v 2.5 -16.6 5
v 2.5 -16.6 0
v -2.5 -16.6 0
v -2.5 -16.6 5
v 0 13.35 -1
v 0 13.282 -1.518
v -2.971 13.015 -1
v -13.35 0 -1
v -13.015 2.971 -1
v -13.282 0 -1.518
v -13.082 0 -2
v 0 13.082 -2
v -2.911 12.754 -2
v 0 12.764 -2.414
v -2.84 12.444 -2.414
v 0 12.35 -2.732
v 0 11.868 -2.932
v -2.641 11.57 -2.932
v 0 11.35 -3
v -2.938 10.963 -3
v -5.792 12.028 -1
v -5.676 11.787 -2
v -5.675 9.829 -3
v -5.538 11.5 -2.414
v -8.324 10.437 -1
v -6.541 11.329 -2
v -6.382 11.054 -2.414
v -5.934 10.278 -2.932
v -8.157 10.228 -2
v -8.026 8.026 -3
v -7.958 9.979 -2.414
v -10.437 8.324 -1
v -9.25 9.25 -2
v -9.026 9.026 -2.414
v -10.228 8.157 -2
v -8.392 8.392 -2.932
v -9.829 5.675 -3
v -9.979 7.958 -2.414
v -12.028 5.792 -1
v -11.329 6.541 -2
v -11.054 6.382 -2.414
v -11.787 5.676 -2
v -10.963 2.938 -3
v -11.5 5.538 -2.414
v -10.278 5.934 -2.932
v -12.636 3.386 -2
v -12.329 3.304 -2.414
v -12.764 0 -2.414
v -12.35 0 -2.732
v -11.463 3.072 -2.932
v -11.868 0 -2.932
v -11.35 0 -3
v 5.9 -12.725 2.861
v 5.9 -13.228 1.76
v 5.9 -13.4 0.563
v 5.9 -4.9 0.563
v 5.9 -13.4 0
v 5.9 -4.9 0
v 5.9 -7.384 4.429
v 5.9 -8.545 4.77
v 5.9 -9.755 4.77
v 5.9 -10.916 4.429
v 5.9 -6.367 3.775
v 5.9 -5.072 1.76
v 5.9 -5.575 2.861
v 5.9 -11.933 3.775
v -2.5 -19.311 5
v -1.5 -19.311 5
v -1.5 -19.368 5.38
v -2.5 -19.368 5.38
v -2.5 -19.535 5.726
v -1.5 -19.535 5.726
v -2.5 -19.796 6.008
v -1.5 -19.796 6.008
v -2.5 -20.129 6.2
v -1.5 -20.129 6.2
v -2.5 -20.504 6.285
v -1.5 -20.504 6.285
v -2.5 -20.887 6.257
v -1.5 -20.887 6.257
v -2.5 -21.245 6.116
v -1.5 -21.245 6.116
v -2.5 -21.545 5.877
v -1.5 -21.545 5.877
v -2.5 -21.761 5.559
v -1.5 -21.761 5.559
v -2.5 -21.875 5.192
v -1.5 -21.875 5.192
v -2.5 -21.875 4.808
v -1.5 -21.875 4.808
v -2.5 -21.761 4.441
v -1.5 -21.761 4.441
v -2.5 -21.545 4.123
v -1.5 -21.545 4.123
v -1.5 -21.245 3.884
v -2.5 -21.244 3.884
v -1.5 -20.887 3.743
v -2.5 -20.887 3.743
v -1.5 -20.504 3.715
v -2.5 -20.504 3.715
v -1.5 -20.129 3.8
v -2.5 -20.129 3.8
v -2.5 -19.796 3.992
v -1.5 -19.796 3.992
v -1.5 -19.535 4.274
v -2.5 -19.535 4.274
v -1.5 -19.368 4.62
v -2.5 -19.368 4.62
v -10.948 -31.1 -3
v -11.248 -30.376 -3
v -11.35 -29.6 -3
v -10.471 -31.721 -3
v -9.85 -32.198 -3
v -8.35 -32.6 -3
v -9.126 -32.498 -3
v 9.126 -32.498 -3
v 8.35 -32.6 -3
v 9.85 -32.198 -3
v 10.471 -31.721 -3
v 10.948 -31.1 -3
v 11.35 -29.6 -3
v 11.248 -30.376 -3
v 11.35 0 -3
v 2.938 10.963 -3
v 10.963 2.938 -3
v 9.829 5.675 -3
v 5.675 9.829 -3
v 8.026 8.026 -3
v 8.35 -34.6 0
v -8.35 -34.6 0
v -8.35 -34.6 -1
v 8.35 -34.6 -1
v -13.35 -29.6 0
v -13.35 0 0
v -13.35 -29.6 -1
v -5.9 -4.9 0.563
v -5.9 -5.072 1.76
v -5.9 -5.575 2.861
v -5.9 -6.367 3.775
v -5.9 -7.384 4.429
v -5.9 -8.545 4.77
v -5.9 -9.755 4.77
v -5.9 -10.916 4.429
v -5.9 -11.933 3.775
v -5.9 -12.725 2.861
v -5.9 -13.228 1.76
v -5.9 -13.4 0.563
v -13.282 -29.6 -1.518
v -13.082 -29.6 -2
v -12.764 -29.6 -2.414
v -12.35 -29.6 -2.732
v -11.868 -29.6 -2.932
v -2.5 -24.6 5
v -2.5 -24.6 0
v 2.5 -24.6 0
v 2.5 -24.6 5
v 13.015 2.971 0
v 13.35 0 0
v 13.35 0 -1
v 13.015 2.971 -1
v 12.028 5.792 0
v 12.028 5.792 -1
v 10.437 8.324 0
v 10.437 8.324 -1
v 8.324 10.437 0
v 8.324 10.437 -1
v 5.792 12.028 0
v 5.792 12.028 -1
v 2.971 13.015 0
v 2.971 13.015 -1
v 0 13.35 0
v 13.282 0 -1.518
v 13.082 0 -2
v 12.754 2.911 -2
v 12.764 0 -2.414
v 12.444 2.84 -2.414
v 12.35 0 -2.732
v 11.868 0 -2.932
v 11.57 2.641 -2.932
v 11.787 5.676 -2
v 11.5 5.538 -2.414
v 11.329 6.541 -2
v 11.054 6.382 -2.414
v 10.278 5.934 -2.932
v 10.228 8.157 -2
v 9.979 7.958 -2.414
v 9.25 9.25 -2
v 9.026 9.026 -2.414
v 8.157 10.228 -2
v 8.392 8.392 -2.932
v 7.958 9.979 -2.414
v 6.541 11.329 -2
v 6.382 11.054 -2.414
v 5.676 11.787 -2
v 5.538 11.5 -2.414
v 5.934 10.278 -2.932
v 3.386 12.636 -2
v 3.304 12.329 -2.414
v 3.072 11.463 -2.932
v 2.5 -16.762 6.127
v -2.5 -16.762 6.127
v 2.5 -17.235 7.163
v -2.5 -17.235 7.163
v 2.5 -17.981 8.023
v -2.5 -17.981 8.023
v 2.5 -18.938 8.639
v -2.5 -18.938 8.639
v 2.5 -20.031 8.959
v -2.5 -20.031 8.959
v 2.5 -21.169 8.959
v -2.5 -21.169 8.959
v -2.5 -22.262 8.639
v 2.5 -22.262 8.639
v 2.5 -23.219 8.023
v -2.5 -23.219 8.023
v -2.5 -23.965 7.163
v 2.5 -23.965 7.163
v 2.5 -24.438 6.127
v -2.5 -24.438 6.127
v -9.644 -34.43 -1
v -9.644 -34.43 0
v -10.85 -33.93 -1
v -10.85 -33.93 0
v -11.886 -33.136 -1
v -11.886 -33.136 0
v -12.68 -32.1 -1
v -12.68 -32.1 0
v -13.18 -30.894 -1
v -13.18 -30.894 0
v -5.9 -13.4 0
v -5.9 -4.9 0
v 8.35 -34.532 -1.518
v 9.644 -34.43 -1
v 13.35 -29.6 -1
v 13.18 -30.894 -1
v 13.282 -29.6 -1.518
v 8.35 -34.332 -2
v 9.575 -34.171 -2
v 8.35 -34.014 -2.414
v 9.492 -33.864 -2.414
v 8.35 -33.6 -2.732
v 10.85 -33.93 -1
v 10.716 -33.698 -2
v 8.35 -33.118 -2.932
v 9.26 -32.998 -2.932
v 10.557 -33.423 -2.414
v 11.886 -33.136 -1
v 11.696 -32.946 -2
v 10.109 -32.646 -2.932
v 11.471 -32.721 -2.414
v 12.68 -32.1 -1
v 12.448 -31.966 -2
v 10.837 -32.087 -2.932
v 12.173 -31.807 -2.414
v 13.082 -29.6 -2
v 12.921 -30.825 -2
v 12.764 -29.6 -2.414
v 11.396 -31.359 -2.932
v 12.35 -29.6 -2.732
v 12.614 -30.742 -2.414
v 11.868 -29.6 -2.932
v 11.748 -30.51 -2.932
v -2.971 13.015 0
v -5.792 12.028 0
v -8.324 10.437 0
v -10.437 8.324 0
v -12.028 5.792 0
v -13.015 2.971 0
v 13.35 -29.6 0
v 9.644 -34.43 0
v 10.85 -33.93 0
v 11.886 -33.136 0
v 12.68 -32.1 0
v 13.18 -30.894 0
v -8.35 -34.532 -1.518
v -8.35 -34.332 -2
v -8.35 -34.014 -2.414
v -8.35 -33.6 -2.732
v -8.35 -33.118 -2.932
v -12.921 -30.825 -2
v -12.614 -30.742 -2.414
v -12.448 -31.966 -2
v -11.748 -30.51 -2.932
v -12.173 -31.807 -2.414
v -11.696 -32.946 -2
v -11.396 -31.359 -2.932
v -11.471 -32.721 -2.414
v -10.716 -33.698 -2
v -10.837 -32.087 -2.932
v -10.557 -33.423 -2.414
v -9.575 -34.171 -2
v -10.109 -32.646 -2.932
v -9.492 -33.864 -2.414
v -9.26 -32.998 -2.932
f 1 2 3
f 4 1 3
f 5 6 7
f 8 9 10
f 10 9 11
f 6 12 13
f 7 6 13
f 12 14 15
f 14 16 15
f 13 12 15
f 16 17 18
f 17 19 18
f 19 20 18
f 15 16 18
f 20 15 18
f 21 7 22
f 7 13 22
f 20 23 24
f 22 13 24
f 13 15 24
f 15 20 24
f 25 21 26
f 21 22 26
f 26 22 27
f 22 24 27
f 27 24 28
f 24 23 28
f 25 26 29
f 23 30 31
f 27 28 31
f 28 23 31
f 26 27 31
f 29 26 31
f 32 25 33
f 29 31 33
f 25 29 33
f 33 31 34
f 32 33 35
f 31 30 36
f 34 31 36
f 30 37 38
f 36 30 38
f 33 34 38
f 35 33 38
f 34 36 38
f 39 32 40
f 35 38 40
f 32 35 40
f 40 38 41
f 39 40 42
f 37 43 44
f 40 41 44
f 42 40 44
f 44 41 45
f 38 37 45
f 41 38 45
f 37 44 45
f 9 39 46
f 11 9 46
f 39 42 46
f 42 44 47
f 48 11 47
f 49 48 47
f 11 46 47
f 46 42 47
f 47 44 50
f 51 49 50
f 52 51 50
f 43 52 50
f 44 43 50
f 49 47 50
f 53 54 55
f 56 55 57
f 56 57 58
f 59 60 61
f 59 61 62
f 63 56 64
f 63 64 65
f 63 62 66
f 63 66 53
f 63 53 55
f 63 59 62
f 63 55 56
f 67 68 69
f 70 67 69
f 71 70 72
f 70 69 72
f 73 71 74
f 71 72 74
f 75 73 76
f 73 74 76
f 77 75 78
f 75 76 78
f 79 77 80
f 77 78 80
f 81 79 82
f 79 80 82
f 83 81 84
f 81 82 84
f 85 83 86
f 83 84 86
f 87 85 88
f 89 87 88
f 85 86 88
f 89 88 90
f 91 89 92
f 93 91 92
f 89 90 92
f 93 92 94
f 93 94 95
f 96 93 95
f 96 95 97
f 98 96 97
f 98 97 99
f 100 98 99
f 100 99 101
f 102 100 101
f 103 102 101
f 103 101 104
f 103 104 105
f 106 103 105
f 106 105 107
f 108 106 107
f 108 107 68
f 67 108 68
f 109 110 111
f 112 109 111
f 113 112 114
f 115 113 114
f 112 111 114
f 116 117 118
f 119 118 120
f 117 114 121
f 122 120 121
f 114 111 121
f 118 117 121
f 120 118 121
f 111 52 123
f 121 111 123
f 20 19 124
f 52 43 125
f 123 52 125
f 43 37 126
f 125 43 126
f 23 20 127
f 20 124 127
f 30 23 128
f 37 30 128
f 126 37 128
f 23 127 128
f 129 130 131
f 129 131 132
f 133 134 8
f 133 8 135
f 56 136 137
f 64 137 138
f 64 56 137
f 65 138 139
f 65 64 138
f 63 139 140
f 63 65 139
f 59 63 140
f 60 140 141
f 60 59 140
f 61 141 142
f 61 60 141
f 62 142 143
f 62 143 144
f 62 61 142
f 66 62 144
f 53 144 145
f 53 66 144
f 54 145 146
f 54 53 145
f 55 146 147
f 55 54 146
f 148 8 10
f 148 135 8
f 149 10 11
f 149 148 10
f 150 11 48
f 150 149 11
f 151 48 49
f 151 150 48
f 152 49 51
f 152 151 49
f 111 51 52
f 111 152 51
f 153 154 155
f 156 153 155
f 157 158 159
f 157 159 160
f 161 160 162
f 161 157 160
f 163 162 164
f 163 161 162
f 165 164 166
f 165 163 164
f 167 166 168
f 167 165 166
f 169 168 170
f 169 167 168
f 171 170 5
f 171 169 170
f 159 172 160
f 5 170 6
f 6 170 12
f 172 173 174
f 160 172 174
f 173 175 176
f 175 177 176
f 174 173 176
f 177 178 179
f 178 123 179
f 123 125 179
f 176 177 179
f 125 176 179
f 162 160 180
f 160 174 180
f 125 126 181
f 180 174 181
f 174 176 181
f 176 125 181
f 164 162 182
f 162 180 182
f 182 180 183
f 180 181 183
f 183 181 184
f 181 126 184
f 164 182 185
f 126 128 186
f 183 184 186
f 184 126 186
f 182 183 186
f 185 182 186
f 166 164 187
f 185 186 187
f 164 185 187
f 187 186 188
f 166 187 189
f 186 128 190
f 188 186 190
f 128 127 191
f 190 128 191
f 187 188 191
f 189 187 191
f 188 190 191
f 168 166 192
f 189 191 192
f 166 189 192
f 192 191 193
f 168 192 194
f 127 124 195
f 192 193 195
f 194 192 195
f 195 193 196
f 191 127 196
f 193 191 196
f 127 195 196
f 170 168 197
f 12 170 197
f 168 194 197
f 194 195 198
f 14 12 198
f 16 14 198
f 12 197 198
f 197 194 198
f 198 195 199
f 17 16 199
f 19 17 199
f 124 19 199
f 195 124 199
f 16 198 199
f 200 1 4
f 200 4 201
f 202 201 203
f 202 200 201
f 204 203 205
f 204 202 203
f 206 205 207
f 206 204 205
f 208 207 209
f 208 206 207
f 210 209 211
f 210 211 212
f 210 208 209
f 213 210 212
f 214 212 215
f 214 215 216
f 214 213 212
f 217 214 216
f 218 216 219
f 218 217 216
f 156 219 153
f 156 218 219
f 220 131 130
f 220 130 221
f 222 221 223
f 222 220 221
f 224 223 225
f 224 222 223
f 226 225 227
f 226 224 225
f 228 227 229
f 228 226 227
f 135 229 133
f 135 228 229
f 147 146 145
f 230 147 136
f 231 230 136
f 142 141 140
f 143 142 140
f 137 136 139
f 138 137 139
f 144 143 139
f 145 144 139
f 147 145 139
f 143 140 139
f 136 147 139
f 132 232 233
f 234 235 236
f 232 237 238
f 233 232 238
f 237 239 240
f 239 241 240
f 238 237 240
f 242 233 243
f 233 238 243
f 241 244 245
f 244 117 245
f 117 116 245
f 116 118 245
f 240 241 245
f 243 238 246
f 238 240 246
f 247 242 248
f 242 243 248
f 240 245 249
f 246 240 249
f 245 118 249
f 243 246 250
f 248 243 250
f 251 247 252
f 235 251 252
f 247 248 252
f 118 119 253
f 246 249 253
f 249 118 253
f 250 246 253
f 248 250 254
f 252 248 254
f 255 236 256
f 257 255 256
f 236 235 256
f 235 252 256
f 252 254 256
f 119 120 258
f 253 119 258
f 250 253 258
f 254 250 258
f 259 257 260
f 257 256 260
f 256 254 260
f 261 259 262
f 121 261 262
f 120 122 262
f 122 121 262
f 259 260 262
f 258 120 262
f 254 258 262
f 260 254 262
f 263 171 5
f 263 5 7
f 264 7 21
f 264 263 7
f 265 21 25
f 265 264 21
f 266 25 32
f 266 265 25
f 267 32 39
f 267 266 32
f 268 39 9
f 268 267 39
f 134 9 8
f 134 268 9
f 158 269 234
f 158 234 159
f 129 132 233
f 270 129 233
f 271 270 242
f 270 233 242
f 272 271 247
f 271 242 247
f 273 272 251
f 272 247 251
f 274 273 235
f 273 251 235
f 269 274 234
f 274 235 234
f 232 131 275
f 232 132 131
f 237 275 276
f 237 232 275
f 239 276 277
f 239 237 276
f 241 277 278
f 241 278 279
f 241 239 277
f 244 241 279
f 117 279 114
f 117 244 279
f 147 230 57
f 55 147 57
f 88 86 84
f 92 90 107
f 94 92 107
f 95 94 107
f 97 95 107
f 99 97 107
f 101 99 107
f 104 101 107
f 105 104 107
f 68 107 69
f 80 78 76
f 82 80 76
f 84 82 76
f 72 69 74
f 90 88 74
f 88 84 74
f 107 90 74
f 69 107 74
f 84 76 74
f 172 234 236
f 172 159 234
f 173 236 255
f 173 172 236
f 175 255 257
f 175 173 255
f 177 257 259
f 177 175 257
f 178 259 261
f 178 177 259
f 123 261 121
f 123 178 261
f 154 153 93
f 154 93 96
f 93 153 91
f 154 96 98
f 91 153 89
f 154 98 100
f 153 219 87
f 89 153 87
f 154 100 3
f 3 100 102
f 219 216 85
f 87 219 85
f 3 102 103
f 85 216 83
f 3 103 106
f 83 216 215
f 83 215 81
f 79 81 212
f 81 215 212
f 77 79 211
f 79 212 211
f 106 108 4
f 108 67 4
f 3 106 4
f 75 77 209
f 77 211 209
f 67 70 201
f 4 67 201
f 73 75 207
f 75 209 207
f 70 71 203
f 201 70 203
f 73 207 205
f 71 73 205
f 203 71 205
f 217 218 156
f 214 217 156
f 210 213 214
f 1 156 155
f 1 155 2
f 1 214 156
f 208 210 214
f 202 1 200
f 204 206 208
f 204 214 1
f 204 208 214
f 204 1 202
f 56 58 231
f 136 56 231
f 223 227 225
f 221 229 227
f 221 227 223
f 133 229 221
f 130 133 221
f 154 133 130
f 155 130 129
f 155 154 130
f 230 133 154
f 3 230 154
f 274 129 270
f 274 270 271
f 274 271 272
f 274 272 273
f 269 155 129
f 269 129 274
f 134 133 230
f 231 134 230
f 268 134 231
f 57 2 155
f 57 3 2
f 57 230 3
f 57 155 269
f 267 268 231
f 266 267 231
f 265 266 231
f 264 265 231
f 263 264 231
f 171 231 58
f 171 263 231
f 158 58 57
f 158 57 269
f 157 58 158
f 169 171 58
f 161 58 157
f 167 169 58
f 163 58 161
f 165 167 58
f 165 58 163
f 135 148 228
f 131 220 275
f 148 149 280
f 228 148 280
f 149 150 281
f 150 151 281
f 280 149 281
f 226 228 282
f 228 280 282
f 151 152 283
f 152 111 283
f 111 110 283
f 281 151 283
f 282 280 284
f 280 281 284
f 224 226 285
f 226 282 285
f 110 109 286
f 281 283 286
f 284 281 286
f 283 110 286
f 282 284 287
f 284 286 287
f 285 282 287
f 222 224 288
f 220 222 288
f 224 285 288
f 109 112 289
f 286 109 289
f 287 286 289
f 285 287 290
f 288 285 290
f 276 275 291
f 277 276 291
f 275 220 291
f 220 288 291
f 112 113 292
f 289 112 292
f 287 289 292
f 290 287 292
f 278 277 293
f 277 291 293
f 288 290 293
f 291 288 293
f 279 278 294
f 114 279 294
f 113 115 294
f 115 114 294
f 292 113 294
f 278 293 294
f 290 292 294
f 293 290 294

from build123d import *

# Parameters (mm, degrees)
F0_W      = 10.85
F0_H      = 10
F0_W_2    = 2.5
F0_H_2    = 8
F0_W_3    = 7.45
F0_H_3    = 3.2
F0_H_4    = 8.5
F0_W_4    = 5.9
F1_DEPTH  = 3
F2_DEPTH  = 0.563
F3_DEPTH  = 5
F6_DEPTH  = 11.8
F7_DEPTH  = 5
F8_DEPTH  = 25
F9_R      = 2.056128731
F10_DEPTH = 1
F11_R     = 5
F12_R     = 5
F13_R     = 2
F14_DEPTH = 3


with BuildPart() as f1:
    # F0 (on Top) → F1 (new body)
    with BuildSketch(Plane.XY):
        Polygon((-5.9, -16.6), (-13.35, -16.6), (-13.35, -24.6), (-2.5, -24.6), (-2.5, -16.6), align=None)
        with Locations((-7.925, -29.6)):
            Rectangle(F0_W, F0_H)
        with Locations((1.25, -29.6)):
            Rectangle(F0_W_2, F0_H)
        with Locations((-1.25, -29.6)):
            Rectangle(F0_W_2, F0_H)
        with Locations((-1.25, -20.6)):
            Rectangle(F0_W_2, F0_H_2)
        with Locations((1.25, -20.6)):
            Rectangle(F0_W_2, F0_H_2)
        Polygon((13.35, -24.6), (13.35, -16.6), (5.9, -16.6), (2.5, -16.6), (2.5, -24.6), align=None)
        with Locations((7.925, -29.6)):
            Rectangle(F0_W, F0_H)
        Polygon((5.9, -13.4), (0, -13.4), (0, -16.6), (2.5, -16.6), (5.9, -16.6), align=None)
        with Locations((9.625, -15)):
            Rectangle(F0_W_3, F0_H_3)
        Polygon((0, -16.6), (0, -13.4), (-5.9, -13.4), (-5.9, -16.6), (-2.5, -16.6), align=None)
        with Locations((-9.625, -15)):
            Rectangle(F0_W_3, F0_H_3)
        with Locations((-9.625, -9.15)):
            Rectangle(F0_W_3, F0_H_4)
        with Locations((-2.95, -9.15)):
            Rectangle(F0_W_4, F0_H_4)
        with Locations((2.95, -9.15)):
            Rectangle(F0_W_4, F0_H_4)
        with Locations((9.625, -9.15)):
            Rectangle(F0_W_3, F0_H_4)
        with BuildLine():
            Line((13.35, -4.9), (13.35, 0))
            ThreePointArc((13.35, 0), (9.4398755288, 9.4398755288), (0, 13.35))
            Line((0, 13.35), (0, -4.9))
            Line((0, -4.9), (5.9, -4.9))
            Line((5.9, -4.9), (13.35, -4.9))
        make_face()
        with BuildLine():
            Line((0, -4.9), (0, 13.35))
            ThreePointArc((0, 13.35), (-9.4398755288, 9.4398755288), (-13.35, 0))
            Line((-13.35, 0), (-13.35, -4.9))
            Line((-13.35, -4.9), (-5.9, -4.9))
            Line((-5.9, -4.9), (0, -4.9))
        make_face()
    extrude(amount=-F1_DEPTH)

    # F0 (on Top) → F2 (join)
    with BuildSketch(Plane.XY):
        with Locations((-2.95, -9.15)):
            Rectangle(F0_W_4, F0_H_4)
        with Locations((2.95, -9.15)):
            Rectangle(F0_W_4, F0_H_4)
    extrude(amount=F2_DEPTH)

    # F0 (on Top) → F3 (join)
    with BuildSketch(Plane.XY):
        with Locations((1.25, -20.6)):
            Rectangle(F0_W_2, F0_H_2)
        with Locations((-1.25, -20.6)):
            Rectangle(F0_W_2, F0_H_2)
    extrude(amount=F3_DEPTH)

    # F5 (on face) → F6 (join)
    with BuildSketch(Plane.YZ.offset(5.9)):
        with BuildLine():
            Line((-13.4, 0.563), (-4.9, 0.563))
            ThreePointArc((-4.9, 0.563), (-9.15, 4.813), (-13.4, 0.563))
        make_face()
    extrude(amount=-F6_DEPTH)

    # F4 (on face) → F7 (join)
    with BuildSketch(Plane.YZ.offset(2.5)):
        with BuildLine():
            Line((-19.311, 5), (-16.6, 5))
            ThreePointArc((-16.6, 5), (-20.6, 9), (-24.6, 5))
            Line((-24.6, 5), (-21.889, 5))
            ThreePointArc((-21.889, 5), (-20.6, 6.289), (-19.311, 5))
        make_face()
    extrude(amount=-F7_DEPTH)

    # F4 (on face) → F8 (cut)
    with BuildSketch(Plane.YZ.offset(2.5)):
        with BuildLine():
            ThreePointArc((-21.889, 5), (-20.6, 3.711), (-19.311, 5))
            Line((-19.311, 5), (-21.889, 5))
        make_face()
        with BuildLine():
            Line((-21.889, 5), (-19.311, 5))
            ThreePointArc((-19.311, 5), (-20.6, 6.289), (-21.889, 5))
        make_face()
    extrude(amount=-F8_DEPTH, mode=Mode.SUBTRACT)

    # F9 (on face) → F10 (join)
    with BuildSketch(Plane.YZ.offset(2.5)):
        with Locations((-20.6, 5)):
            Circle(F9_R)
    extrude(amount=-F10_DEPTH)

    # F11
    f11_edges = [f1.edges().sort_by_distance(p)[0] for p in [
        (13.35, -34.6, -1.5),
    ]]
    fillet(f11_edges, radius=F11_R)

    # F12
    f12_edges = [f1.edges().sort_by_distance(p)[0] for p in [
        (-13.35, -34.6, -1.5),
    ]]
    fillet(f12_edges, radius=F12_R)

    # F13
    f13_edges = [f1.edges().sort_by_distance(p)[0] for p in [
        (0, -34.6, -3),
    ]]
    fillet(f13_edges, radius=F13_R)

    # F14 (add): a face of the model
    f14_faces = [f1.faces().sort_by_distance(p)[0] for p in [
        (1.5, -20.6, 5),
    ]]
    extrude(f14_faces, amount=F14_DEPTH)


solid = f1.part
